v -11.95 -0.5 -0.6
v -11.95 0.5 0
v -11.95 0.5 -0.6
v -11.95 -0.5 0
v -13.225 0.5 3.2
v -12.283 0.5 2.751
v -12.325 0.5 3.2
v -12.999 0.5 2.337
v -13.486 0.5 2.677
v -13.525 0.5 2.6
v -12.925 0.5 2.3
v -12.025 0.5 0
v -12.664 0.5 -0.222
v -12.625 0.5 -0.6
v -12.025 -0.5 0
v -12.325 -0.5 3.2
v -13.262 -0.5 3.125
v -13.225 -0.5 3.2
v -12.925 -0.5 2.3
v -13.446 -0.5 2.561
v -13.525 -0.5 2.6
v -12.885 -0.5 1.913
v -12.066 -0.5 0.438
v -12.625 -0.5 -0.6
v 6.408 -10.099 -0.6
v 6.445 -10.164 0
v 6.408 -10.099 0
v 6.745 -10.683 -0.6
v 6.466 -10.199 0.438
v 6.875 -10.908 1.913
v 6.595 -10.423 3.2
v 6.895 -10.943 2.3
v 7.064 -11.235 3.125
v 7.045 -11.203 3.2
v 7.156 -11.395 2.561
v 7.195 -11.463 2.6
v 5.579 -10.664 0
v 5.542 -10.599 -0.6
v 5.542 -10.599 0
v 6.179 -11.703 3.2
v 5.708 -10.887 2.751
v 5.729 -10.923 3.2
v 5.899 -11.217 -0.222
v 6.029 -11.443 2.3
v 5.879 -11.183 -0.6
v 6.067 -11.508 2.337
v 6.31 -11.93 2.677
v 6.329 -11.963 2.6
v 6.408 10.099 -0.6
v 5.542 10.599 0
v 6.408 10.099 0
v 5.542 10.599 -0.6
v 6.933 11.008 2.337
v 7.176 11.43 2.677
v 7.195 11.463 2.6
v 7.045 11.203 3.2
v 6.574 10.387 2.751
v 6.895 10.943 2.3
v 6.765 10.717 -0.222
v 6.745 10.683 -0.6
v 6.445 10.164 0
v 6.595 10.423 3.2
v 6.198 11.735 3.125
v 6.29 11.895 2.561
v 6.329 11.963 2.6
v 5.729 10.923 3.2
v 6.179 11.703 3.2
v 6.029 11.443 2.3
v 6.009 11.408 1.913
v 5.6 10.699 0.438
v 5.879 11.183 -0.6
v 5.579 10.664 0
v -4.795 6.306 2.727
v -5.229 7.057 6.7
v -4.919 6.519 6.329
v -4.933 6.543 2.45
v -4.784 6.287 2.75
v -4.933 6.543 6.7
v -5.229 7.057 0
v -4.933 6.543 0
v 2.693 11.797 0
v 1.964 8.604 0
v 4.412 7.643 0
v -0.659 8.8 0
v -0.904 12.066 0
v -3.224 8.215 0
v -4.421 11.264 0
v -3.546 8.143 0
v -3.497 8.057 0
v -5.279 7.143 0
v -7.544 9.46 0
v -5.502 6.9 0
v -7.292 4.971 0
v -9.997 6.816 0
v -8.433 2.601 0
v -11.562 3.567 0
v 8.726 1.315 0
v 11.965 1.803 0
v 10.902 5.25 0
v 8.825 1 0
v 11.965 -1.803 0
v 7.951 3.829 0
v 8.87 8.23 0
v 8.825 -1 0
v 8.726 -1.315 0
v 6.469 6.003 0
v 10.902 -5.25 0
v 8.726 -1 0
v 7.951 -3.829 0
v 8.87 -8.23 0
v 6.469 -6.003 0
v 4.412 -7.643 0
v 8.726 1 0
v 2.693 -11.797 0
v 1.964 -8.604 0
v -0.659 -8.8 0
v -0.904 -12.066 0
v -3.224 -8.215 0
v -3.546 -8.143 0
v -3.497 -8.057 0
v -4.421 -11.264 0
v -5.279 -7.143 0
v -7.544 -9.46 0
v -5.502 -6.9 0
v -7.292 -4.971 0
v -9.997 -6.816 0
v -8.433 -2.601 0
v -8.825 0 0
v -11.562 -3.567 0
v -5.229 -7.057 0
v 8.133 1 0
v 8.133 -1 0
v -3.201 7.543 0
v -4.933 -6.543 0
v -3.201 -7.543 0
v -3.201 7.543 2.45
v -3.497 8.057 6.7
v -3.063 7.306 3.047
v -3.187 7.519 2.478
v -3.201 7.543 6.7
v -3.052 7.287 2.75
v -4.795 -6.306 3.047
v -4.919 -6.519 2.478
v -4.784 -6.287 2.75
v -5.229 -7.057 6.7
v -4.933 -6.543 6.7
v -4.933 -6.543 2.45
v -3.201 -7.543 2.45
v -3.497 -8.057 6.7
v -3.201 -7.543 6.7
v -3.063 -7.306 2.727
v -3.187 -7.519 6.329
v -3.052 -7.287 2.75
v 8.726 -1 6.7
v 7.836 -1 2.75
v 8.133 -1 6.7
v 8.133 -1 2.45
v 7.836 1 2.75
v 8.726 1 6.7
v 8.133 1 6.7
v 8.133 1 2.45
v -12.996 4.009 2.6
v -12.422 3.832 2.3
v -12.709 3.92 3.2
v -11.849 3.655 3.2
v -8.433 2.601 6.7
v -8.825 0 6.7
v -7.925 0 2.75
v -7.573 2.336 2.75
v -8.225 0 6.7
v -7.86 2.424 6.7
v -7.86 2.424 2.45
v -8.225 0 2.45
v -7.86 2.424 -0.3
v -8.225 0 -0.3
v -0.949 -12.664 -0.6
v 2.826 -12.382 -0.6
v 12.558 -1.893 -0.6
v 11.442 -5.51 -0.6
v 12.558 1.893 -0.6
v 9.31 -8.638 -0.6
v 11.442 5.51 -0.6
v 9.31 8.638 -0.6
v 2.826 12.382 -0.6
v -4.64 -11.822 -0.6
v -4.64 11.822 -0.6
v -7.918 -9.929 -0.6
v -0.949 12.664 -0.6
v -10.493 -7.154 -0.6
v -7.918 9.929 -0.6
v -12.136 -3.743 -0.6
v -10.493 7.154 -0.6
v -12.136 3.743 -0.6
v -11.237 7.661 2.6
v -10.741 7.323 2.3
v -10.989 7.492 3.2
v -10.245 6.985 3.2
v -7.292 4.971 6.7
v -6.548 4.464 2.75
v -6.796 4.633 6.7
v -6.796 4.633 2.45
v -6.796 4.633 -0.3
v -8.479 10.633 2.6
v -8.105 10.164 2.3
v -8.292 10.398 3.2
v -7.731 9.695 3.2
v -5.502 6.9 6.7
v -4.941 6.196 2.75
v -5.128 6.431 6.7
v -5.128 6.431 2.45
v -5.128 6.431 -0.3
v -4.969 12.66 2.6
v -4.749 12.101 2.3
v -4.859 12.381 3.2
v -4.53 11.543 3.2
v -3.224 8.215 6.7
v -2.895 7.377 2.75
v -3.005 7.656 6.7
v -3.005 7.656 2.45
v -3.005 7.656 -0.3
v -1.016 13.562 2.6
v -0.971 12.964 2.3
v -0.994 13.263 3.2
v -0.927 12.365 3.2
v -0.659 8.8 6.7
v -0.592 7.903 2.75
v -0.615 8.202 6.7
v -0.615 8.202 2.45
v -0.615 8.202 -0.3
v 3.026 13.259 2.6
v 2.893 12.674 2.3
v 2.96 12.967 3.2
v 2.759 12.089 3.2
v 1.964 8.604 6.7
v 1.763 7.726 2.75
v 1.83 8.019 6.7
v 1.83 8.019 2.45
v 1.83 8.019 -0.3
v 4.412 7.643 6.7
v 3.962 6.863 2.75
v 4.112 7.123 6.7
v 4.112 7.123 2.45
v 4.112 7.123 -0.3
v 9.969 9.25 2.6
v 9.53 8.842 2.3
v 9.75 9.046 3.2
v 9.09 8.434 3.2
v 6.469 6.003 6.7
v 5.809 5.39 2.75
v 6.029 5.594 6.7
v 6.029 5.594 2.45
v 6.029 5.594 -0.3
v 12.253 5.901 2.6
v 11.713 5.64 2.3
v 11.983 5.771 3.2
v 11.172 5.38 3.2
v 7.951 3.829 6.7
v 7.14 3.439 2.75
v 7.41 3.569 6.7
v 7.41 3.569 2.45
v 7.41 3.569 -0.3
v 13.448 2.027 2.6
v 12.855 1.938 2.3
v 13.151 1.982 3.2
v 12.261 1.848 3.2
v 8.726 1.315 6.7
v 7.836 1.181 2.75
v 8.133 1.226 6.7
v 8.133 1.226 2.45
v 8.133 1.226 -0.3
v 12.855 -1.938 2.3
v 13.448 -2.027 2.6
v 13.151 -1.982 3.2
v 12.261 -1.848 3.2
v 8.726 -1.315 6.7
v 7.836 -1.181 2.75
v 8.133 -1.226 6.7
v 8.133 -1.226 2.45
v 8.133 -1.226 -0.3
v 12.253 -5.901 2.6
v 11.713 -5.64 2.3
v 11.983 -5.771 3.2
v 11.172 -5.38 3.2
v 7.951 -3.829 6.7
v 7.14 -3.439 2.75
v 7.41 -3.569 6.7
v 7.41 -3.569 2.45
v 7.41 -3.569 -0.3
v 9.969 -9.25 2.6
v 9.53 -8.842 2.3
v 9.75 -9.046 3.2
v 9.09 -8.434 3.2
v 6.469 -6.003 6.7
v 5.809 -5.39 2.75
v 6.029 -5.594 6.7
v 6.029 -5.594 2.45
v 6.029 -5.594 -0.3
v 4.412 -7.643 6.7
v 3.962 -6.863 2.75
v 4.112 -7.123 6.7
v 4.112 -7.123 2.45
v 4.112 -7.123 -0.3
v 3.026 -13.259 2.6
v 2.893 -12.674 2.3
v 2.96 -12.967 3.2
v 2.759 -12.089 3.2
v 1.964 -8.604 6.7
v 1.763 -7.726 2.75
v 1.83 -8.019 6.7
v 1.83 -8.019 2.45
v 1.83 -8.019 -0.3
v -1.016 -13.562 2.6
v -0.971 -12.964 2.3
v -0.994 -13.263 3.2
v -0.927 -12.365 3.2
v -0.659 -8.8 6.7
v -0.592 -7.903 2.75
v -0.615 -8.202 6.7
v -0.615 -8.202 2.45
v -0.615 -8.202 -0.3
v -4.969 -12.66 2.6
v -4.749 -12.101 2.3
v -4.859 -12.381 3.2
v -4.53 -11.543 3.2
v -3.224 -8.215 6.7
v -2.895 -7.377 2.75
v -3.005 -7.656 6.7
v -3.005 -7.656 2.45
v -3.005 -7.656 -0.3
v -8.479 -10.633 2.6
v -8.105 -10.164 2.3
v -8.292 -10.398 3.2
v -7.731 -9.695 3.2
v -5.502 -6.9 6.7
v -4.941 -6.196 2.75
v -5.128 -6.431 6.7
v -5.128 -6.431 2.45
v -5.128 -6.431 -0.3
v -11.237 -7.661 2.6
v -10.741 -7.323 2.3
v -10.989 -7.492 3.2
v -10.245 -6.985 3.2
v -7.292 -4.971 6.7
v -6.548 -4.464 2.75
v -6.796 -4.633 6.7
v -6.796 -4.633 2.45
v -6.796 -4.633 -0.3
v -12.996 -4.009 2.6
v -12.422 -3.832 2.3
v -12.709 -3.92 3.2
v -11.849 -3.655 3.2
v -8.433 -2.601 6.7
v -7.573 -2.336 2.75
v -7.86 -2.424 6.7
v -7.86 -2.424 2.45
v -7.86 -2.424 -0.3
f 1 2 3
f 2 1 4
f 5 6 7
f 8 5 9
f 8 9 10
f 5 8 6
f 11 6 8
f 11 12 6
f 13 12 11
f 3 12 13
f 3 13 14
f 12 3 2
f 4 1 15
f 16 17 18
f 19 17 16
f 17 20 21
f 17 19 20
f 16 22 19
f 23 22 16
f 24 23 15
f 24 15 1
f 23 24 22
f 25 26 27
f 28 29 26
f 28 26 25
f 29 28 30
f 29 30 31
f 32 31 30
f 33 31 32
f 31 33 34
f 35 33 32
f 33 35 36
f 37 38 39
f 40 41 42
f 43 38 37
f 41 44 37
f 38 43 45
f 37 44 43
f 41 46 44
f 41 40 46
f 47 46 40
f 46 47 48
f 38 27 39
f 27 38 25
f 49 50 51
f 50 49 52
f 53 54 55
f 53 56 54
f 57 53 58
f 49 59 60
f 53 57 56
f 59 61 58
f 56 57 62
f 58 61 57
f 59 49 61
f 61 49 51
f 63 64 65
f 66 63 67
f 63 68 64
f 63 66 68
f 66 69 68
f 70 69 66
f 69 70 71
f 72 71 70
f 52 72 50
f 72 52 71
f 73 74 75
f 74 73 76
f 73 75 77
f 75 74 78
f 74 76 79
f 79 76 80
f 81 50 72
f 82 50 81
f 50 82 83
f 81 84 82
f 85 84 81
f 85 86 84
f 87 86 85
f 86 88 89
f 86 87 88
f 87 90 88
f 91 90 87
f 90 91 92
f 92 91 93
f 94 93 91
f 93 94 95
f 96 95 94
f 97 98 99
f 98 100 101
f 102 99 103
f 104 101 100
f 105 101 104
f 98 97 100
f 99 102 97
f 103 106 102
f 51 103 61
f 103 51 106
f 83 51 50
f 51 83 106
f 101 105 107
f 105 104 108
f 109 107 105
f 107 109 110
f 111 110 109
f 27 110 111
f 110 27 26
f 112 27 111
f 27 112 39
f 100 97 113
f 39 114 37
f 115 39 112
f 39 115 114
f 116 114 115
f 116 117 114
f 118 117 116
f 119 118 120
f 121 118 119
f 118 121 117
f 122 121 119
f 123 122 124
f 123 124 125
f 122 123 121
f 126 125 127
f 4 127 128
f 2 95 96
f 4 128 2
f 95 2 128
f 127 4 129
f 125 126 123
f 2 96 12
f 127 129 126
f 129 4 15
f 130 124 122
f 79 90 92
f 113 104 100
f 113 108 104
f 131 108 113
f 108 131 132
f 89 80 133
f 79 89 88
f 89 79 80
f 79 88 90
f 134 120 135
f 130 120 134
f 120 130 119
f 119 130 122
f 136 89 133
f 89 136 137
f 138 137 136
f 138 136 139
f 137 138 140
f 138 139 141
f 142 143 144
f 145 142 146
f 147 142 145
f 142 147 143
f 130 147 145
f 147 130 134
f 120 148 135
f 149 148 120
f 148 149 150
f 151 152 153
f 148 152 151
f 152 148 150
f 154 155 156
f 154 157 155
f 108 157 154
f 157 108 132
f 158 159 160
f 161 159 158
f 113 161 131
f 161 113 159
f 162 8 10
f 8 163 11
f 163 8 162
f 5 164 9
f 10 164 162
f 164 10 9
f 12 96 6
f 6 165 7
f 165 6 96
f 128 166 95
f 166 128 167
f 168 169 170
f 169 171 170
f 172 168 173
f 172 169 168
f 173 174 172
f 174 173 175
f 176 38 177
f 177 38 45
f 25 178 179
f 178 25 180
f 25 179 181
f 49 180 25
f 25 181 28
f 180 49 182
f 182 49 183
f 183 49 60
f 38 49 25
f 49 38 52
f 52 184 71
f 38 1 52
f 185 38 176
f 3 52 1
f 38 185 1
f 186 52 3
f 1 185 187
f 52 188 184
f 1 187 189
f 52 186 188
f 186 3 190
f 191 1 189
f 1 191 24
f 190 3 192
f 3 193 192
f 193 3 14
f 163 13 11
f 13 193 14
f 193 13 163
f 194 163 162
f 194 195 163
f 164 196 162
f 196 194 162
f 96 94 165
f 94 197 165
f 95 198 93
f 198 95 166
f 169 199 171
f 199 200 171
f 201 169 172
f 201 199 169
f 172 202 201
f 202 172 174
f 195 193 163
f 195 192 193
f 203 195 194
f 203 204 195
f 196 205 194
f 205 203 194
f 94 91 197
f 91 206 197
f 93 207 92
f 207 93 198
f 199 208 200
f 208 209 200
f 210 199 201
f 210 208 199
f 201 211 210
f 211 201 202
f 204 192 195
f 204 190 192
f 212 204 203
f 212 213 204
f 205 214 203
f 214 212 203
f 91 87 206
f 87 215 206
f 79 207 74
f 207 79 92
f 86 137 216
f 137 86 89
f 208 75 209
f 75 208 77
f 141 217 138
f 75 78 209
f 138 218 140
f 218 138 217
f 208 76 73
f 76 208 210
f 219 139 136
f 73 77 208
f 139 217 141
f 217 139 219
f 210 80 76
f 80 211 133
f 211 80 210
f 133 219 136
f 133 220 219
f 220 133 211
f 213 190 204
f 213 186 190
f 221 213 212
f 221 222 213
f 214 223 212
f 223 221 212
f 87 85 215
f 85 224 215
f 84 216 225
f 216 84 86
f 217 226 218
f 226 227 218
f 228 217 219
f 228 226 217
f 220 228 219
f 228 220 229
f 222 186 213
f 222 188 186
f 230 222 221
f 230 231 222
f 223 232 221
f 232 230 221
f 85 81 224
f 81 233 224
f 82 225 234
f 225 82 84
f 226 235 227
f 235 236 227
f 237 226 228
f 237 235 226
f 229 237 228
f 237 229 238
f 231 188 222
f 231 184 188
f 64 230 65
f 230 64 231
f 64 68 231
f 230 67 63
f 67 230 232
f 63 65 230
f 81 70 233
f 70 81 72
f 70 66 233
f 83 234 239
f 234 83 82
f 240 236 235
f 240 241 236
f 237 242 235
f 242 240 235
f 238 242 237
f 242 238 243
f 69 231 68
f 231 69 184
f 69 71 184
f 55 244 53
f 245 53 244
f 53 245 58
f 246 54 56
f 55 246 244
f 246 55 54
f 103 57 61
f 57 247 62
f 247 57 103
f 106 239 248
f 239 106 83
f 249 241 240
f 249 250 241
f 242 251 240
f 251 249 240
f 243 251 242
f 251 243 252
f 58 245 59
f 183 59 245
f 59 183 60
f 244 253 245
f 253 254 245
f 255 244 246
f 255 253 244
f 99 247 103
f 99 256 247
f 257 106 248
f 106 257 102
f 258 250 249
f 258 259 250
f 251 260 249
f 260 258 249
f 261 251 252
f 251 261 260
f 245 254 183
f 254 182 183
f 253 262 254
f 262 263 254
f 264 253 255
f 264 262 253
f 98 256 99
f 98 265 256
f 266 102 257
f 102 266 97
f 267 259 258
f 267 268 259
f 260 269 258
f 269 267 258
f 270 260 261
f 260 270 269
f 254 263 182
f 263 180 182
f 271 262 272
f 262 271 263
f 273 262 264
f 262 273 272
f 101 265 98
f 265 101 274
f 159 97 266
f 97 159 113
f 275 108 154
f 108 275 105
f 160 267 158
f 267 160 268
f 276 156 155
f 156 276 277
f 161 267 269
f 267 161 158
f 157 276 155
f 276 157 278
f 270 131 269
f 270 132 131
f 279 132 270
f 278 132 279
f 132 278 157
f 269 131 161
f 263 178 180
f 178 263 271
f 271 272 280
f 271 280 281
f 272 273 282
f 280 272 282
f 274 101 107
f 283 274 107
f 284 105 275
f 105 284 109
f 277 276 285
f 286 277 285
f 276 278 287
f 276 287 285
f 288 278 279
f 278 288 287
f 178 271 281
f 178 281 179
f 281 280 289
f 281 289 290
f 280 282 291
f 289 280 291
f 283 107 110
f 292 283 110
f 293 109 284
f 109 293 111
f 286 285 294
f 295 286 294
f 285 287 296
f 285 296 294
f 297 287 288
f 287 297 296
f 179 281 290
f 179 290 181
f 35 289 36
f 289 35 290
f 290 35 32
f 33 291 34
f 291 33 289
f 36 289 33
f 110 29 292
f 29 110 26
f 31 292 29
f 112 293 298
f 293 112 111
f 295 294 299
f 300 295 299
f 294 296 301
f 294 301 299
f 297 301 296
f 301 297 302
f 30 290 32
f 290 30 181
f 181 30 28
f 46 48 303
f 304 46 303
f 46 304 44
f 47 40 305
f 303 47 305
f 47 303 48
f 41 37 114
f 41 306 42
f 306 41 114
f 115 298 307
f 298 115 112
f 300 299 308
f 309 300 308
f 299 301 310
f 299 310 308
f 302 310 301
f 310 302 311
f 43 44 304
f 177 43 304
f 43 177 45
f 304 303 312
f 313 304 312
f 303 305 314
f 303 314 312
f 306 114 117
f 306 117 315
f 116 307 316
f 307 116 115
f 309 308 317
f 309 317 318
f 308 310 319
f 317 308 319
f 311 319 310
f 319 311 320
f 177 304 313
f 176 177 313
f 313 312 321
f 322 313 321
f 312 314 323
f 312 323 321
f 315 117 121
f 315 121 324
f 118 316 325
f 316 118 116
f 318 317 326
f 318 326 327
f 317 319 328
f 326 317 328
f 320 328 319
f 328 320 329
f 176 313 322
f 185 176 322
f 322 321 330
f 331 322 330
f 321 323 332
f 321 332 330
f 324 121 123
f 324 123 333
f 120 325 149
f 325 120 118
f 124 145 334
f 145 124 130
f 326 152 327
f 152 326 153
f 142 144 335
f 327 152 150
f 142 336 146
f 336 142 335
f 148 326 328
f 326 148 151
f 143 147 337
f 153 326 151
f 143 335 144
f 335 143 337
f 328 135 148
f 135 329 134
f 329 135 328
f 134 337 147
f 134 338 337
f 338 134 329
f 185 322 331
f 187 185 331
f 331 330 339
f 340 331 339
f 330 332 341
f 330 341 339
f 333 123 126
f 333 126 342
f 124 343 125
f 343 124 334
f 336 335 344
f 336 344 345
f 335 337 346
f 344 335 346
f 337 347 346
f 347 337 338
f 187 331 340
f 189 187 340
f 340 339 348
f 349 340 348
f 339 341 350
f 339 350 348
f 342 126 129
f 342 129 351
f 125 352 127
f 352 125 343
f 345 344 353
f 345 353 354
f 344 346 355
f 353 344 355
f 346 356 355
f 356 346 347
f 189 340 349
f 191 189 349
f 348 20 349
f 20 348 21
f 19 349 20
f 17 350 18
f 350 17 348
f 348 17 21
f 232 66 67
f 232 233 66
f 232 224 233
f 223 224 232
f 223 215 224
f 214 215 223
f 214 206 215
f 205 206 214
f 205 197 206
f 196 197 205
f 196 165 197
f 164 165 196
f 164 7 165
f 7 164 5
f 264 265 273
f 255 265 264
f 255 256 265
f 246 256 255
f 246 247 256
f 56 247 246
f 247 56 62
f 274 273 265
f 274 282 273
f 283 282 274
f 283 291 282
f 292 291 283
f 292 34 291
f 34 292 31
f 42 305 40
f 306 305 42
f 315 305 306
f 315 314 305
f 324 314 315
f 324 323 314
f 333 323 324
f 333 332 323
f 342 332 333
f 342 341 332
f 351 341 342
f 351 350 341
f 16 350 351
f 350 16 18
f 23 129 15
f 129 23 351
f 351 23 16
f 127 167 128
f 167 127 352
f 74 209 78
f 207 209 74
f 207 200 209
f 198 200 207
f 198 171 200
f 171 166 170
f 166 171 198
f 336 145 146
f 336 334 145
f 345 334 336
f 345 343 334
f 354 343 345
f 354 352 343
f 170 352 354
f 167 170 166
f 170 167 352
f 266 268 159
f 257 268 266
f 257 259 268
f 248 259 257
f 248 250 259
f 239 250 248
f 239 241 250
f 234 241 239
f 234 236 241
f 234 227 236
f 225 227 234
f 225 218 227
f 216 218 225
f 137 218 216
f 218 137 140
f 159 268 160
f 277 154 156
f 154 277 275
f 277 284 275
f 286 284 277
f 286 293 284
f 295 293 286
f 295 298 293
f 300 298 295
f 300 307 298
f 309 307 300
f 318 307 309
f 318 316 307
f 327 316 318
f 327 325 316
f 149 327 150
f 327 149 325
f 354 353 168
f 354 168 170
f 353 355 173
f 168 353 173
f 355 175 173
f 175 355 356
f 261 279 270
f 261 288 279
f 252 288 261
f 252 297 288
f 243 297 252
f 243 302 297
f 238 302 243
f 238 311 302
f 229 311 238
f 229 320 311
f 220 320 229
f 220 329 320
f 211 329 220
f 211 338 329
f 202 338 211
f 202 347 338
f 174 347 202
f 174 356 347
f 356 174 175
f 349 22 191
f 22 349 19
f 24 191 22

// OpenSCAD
/* [Cap features] */
cap_diameter     = 26;  // [26:normal, 29:large]
fragments_number  = 21;

/* [Magnet features] */
magnet_diameter   =  15.85;
magnet_height     =  3.05;

/* [Piece specs] */
cap_top_diameter = 18;
cap_height       =  7;
diaphragm_thickness= 0.3;
material_thickness = 0.6;
snap_height       =  2;
tolerance         =  0.3;

tol = tolerance;
c_D = cap_diameter;
c_d = ((cap_top_diameter) > (magnet_diameter))
    ? cap_top_diameter
	 : magnet_diameter;
c_h = cap_height;
d_t = diaphragm_thickness;
m_d = magnet_diameter;
m_h = magnet_height;
m_t = material_thickness;
s_h = snap_height;

$fn=fragments_number;

module snap_profile ()
{
  polygon([
	 [0, -m_t],
	 [c_D/2-tol, -m_t],
	 [c_D/2, s_h+tol],
	 [c_D/2+2*tol, s_h+tol+m_t/2],
	 [c_D/2+tol, s_h+2*tol+m_t],
	 [c_D/2-m_t, s_h+2*tol+m_t],
	 [c_D/2-m_t-tol, 0],
	 [m_d/2+tol+m_t, 0],
	 [m_d/2+tol+m_t, c_h-tol],
	 [m_d/2+tol, c_h-tol],
	 [m_d/2, -m_t+m_h+tol],
	 [m_d/2+tol, -m_t+m_h],
	 [m_d/2+tol, -m_t+d_t],
	 [0, -m_t+d_t]
  ]);
}

difference ()
{
  rotate_extrude() snap_profile();
      for (r=[0,120,240])
	 rotate([0,0,r])
  translate([-c_D/2-2*tol,0-0.5,-m_t]) cube([2*m_t+1.5*tol,1,c_h]);
  for (r=[30,150,270])
	 rotate([0,0,r])
		translate([-1,0,0])
		  cube([2,m_d/2+m_t+tol,c_h]);
}

/* Old design */

module encasing_profile ()
{
  polygon([
	 [m_d/2+tol, 0],
	 [c_D/2-tol/2, 0],
	 [c_D/2-0.5, 1],
	 [c_d/2, 1],
	 [c_d/2-tol,c_h],
	 [c_d/2-1,c_h],
	 [c_d/2-1,1],
	 [m_d/2+tol,1]
  ]);
}

module support_profile ()
{
  polygon([
	 [2, m_h],
	 [m_d/2-1, m_h],
	 [c_d/2-1-tol, m_h],
	 [c_d/2-1-tol, m_h+1],
	 [m_d/2, m_h+1],
	 [m_d/2, c_h],
	 [m_d/2-1,c_h],
	 [m_d/2-1, m_h+1],
	 [2, m_h+1]
  ]);
}

*rotate_extrude() encasing_profile();
*rotate_extrude() support_profile();
